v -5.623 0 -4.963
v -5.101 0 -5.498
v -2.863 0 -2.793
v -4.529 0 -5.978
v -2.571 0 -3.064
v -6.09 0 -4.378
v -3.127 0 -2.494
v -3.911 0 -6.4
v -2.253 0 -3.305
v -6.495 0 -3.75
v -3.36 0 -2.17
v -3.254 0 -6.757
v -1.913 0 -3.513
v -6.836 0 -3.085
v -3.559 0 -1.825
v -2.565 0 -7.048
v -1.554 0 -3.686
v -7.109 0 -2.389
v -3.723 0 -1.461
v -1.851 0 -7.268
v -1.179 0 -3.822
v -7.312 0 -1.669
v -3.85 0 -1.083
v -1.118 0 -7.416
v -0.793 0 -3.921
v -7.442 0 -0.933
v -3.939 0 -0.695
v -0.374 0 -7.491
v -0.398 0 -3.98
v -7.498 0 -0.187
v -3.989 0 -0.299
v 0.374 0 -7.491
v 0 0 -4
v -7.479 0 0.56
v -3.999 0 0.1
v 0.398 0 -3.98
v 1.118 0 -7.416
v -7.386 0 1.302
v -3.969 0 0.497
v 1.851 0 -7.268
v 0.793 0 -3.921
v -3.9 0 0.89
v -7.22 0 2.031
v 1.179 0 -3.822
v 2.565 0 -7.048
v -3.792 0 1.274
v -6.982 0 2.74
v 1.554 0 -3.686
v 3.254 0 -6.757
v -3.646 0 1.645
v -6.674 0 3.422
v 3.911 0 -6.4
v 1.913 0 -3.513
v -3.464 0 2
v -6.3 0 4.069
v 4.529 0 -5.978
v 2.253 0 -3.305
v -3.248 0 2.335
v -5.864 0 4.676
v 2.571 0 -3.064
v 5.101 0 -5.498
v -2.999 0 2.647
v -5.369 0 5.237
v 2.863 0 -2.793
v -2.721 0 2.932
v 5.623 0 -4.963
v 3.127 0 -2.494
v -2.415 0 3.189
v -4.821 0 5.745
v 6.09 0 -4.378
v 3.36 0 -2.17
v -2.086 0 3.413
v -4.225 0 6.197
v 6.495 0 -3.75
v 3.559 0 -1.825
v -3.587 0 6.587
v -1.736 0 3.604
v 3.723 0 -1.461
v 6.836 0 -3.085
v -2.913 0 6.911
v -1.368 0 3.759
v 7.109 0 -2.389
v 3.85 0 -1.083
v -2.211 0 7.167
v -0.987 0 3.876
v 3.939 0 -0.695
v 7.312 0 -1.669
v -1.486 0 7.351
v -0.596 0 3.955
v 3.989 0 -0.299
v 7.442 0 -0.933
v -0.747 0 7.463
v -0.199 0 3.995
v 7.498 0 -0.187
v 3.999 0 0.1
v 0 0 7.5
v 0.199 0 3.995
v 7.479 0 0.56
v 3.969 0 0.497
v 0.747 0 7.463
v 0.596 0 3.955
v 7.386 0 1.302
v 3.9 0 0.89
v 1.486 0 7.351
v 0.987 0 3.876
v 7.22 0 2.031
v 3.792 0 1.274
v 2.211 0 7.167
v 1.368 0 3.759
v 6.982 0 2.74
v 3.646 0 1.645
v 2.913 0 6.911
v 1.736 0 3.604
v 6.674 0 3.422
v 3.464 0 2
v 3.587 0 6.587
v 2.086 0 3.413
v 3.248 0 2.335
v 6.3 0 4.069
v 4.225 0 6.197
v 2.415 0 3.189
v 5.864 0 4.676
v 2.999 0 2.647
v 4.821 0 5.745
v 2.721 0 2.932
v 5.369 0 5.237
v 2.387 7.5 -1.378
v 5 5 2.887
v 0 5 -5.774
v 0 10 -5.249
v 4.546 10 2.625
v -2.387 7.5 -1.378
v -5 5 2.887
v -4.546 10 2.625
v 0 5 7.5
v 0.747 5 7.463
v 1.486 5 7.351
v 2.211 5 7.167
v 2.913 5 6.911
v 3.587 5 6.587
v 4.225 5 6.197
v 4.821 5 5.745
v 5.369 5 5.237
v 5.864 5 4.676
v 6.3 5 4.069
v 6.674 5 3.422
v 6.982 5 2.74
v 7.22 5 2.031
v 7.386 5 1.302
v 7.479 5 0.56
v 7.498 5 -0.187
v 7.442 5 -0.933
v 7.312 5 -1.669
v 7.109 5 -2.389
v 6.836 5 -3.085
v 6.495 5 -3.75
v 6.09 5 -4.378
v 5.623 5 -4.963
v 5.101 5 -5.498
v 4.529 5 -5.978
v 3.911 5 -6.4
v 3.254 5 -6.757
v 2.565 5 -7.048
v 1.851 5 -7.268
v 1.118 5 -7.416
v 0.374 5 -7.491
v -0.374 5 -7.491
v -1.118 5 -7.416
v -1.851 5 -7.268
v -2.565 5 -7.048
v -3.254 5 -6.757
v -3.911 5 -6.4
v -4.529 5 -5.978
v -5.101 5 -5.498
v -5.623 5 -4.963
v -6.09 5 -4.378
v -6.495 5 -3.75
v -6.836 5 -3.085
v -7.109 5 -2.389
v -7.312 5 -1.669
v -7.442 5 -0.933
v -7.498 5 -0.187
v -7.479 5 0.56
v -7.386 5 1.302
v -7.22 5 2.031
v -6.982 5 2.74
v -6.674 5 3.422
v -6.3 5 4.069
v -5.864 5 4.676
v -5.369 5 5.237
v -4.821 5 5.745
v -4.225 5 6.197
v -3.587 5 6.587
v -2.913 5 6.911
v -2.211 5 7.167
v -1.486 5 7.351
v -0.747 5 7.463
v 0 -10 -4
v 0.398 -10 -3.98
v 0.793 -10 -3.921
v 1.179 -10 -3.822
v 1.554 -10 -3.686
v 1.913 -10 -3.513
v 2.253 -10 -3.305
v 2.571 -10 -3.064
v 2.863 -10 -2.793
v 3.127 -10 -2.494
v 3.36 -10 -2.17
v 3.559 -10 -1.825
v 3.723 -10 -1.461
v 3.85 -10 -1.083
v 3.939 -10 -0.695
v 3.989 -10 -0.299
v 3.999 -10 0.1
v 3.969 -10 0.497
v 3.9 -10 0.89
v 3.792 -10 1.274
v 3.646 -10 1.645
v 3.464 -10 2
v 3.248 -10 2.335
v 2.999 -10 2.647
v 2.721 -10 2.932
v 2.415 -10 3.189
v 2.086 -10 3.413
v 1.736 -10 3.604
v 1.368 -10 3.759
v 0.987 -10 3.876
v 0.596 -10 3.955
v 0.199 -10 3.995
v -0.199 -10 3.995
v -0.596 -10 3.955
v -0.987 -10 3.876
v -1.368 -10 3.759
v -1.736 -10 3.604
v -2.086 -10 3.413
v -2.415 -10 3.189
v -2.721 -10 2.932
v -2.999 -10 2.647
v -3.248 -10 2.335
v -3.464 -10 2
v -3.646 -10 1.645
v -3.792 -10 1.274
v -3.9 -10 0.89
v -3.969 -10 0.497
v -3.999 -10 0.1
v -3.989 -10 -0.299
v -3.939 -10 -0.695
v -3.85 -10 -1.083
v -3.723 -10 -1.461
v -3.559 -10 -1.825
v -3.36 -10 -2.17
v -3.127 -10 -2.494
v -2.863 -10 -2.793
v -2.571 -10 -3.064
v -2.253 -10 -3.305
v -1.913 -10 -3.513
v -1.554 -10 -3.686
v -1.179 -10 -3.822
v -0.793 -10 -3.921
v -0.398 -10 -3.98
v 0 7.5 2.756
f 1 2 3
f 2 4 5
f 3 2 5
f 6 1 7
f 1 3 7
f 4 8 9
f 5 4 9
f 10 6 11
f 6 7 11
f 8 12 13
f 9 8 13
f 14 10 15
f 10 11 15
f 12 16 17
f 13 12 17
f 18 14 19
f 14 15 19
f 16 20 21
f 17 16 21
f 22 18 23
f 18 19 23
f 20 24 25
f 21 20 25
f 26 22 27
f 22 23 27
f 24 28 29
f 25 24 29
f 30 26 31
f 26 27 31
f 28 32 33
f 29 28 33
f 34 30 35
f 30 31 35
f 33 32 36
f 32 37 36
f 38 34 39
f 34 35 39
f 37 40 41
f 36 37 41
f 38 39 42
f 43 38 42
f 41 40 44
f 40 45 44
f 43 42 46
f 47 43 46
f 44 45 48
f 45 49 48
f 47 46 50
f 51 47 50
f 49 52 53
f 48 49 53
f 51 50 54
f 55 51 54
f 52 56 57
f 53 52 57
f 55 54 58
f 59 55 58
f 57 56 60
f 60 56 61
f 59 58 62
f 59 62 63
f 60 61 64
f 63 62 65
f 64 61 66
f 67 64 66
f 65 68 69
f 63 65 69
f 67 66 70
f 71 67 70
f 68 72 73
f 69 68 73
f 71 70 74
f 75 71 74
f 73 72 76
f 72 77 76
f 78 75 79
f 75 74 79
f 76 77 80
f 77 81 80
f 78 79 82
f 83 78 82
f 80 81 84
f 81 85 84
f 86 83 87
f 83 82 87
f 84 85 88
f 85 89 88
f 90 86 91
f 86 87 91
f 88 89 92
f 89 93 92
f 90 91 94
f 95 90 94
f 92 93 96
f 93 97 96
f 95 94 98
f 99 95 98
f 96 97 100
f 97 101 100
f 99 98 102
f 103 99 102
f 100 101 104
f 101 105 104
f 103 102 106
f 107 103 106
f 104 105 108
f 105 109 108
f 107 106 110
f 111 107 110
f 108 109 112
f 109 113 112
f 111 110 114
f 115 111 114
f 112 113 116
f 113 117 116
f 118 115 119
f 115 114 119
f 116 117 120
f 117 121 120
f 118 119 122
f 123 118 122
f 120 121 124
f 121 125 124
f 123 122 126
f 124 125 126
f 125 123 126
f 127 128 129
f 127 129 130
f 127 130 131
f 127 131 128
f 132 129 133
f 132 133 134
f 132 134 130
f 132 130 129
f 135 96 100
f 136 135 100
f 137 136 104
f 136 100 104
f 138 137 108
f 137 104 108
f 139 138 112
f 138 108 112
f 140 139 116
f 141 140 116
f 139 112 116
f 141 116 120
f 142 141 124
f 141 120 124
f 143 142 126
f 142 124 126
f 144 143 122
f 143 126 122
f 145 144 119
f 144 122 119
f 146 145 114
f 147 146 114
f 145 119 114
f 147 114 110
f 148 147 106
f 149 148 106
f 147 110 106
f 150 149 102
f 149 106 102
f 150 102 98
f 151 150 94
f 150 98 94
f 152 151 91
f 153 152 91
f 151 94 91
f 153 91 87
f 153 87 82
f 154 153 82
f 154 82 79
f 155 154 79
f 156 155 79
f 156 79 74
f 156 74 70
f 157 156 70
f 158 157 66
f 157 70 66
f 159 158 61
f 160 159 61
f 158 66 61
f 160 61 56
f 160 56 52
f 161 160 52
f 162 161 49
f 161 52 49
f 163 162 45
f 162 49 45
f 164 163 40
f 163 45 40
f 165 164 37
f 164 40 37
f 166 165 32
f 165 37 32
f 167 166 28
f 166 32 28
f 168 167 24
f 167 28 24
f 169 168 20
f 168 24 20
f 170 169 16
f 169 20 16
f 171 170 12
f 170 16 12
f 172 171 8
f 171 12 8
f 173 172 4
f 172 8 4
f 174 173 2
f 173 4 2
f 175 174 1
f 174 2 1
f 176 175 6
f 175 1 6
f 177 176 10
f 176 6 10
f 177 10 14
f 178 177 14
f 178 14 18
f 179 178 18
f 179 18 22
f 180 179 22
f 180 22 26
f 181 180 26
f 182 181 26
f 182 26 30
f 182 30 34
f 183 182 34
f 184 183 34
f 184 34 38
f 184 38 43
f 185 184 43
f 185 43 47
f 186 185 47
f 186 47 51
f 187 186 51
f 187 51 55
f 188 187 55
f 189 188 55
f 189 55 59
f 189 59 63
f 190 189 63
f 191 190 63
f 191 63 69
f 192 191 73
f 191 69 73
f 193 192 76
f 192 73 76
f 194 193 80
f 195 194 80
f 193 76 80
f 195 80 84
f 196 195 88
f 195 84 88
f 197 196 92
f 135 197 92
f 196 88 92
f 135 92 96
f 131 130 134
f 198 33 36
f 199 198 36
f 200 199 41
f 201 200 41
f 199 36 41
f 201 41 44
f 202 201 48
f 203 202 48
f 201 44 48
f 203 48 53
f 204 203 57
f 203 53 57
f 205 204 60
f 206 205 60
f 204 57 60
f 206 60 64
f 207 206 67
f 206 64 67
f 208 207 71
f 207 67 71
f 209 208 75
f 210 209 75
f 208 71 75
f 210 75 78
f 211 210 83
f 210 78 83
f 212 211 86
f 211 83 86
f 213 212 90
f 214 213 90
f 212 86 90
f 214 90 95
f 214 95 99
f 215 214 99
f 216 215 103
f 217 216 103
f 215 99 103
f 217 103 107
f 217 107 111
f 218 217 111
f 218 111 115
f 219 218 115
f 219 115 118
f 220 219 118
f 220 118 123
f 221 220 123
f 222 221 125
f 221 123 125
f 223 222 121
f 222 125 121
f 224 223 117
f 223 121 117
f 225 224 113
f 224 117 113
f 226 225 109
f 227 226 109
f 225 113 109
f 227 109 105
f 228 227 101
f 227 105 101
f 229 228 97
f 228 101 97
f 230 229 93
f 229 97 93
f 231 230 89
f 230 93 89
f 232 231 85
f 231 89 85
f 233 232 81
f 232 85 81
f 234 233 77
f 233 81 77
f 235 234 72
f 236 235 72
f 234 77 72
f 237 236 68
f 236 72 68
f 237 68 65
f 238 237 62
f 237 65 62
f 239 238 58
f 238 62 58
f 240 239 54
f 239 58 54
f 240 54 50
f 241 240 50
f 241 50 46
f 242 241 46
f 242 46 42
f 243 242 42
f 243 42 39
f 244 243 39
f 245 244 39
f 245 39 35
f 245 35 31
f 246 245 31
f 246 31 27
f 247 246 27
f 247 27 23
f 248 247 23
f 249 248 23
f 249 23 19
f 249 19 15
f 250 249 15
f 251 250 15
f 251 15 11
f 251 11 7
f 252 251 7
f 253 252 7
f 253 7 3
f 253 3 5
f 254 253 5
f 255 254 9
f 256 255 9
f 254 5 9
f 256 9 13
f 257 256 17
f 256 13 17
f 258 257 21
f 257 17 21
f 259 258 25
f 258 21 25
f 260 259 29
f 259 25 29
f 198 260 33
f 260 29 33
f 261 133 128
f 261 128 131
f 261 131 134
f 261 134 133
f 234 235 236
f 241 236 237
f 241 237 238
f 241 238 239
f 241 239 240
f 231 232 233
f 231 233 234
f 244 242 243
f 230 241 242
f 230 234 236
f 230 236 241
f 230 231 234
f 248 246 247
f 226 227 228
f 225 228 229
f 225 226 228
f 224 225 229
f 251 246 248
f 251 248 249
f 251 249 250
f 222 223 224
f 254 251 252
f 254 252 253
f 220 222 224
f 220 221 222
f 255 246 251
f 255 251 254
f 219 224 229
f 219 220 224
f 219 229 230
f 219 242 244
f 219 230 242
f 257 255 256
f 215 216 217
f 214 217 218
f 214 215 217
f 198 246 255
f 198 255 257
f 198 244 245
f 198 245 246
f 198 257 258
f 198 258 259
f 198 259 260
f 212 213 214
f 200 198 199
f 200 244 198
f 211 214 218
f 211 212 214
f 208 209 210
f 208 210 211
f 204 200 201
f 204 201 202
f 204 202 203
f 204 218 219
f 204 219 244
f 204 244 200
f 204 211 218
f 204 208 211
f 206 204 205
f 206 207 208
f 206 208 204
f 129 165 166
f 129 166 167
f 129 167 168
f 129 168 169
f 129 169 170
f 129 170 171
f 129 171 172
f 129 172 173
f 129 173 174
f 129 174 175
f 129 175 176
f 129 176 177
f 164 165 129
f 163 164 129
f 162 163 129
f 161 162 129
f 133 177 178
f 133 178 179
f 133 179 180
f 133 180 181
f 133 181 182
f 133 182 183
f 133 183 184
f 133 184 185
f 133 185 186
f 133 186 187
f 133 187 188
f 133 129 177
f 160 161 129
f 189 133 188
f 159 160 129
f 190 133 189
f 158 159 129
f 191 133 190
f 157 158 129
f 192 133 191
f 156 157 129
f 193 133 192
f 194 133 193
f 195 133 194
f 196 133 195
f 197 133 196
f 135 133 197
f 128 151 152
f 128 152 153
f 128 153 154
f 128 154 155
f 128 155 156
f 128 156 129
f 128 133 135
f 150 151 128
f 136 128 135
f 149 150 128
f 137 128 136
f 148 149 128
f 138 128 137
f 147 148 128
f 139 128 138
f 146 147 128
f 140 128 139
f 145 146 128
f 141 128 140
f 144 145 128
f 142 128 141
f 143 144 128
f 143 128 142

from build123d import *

# Parameters (mm, degrees)
SKETCH1_R           = 7.5
BOSS_EXTRUDE1_DEPTH = 5
BOSS_EXTRUDE2_DEPTH = 5
BOSS_EXTRUDE2_TAPER = 3
SKETCH3_R           = 4
BOSS_EXTRUDE3_DEPTH = 10


with BuildPart() as part:
    # Sketch1 → Boss-Extrude1 (new body)
    with BuildSketch(Plane(origin=(0, 0, 0), x_dir=(1, 0, 0), z_dir=(0, 1, 0))):
        with Locations(Location((0, 0, 0), (0, 0, 270))):
            Circle(SKETCH1_R)
    extrude(amount=BOSS_EXTRUDE1_DEPTH)

    # Sketch2 → Boss-Extrude2 (add)
    with BuildSketch(Plane(origin=(0, 5, 0), x_dir=(1, 0, 0), z_dir=(0, 1, 0))):
        Polygon((0, 5.773502692), (-5, -2.886751346), (5, -2.886751346), align=None)
    extrude(amount=BOSS_EXTRUDE2_DEPTH, taper=BOSS_EXTRUDE2_TAPER)

    # Sketch3 → Boss-Extrude3 (add)
    with BuildSketch(Plane.XZ):
        with Locations(Location((0, 0, 0), (0, 0, 270))):
            Circle(SKETCH3_R)
    extrude(amount=BOSS_EXTRUDE3_DEPTH)


solid = part.part
